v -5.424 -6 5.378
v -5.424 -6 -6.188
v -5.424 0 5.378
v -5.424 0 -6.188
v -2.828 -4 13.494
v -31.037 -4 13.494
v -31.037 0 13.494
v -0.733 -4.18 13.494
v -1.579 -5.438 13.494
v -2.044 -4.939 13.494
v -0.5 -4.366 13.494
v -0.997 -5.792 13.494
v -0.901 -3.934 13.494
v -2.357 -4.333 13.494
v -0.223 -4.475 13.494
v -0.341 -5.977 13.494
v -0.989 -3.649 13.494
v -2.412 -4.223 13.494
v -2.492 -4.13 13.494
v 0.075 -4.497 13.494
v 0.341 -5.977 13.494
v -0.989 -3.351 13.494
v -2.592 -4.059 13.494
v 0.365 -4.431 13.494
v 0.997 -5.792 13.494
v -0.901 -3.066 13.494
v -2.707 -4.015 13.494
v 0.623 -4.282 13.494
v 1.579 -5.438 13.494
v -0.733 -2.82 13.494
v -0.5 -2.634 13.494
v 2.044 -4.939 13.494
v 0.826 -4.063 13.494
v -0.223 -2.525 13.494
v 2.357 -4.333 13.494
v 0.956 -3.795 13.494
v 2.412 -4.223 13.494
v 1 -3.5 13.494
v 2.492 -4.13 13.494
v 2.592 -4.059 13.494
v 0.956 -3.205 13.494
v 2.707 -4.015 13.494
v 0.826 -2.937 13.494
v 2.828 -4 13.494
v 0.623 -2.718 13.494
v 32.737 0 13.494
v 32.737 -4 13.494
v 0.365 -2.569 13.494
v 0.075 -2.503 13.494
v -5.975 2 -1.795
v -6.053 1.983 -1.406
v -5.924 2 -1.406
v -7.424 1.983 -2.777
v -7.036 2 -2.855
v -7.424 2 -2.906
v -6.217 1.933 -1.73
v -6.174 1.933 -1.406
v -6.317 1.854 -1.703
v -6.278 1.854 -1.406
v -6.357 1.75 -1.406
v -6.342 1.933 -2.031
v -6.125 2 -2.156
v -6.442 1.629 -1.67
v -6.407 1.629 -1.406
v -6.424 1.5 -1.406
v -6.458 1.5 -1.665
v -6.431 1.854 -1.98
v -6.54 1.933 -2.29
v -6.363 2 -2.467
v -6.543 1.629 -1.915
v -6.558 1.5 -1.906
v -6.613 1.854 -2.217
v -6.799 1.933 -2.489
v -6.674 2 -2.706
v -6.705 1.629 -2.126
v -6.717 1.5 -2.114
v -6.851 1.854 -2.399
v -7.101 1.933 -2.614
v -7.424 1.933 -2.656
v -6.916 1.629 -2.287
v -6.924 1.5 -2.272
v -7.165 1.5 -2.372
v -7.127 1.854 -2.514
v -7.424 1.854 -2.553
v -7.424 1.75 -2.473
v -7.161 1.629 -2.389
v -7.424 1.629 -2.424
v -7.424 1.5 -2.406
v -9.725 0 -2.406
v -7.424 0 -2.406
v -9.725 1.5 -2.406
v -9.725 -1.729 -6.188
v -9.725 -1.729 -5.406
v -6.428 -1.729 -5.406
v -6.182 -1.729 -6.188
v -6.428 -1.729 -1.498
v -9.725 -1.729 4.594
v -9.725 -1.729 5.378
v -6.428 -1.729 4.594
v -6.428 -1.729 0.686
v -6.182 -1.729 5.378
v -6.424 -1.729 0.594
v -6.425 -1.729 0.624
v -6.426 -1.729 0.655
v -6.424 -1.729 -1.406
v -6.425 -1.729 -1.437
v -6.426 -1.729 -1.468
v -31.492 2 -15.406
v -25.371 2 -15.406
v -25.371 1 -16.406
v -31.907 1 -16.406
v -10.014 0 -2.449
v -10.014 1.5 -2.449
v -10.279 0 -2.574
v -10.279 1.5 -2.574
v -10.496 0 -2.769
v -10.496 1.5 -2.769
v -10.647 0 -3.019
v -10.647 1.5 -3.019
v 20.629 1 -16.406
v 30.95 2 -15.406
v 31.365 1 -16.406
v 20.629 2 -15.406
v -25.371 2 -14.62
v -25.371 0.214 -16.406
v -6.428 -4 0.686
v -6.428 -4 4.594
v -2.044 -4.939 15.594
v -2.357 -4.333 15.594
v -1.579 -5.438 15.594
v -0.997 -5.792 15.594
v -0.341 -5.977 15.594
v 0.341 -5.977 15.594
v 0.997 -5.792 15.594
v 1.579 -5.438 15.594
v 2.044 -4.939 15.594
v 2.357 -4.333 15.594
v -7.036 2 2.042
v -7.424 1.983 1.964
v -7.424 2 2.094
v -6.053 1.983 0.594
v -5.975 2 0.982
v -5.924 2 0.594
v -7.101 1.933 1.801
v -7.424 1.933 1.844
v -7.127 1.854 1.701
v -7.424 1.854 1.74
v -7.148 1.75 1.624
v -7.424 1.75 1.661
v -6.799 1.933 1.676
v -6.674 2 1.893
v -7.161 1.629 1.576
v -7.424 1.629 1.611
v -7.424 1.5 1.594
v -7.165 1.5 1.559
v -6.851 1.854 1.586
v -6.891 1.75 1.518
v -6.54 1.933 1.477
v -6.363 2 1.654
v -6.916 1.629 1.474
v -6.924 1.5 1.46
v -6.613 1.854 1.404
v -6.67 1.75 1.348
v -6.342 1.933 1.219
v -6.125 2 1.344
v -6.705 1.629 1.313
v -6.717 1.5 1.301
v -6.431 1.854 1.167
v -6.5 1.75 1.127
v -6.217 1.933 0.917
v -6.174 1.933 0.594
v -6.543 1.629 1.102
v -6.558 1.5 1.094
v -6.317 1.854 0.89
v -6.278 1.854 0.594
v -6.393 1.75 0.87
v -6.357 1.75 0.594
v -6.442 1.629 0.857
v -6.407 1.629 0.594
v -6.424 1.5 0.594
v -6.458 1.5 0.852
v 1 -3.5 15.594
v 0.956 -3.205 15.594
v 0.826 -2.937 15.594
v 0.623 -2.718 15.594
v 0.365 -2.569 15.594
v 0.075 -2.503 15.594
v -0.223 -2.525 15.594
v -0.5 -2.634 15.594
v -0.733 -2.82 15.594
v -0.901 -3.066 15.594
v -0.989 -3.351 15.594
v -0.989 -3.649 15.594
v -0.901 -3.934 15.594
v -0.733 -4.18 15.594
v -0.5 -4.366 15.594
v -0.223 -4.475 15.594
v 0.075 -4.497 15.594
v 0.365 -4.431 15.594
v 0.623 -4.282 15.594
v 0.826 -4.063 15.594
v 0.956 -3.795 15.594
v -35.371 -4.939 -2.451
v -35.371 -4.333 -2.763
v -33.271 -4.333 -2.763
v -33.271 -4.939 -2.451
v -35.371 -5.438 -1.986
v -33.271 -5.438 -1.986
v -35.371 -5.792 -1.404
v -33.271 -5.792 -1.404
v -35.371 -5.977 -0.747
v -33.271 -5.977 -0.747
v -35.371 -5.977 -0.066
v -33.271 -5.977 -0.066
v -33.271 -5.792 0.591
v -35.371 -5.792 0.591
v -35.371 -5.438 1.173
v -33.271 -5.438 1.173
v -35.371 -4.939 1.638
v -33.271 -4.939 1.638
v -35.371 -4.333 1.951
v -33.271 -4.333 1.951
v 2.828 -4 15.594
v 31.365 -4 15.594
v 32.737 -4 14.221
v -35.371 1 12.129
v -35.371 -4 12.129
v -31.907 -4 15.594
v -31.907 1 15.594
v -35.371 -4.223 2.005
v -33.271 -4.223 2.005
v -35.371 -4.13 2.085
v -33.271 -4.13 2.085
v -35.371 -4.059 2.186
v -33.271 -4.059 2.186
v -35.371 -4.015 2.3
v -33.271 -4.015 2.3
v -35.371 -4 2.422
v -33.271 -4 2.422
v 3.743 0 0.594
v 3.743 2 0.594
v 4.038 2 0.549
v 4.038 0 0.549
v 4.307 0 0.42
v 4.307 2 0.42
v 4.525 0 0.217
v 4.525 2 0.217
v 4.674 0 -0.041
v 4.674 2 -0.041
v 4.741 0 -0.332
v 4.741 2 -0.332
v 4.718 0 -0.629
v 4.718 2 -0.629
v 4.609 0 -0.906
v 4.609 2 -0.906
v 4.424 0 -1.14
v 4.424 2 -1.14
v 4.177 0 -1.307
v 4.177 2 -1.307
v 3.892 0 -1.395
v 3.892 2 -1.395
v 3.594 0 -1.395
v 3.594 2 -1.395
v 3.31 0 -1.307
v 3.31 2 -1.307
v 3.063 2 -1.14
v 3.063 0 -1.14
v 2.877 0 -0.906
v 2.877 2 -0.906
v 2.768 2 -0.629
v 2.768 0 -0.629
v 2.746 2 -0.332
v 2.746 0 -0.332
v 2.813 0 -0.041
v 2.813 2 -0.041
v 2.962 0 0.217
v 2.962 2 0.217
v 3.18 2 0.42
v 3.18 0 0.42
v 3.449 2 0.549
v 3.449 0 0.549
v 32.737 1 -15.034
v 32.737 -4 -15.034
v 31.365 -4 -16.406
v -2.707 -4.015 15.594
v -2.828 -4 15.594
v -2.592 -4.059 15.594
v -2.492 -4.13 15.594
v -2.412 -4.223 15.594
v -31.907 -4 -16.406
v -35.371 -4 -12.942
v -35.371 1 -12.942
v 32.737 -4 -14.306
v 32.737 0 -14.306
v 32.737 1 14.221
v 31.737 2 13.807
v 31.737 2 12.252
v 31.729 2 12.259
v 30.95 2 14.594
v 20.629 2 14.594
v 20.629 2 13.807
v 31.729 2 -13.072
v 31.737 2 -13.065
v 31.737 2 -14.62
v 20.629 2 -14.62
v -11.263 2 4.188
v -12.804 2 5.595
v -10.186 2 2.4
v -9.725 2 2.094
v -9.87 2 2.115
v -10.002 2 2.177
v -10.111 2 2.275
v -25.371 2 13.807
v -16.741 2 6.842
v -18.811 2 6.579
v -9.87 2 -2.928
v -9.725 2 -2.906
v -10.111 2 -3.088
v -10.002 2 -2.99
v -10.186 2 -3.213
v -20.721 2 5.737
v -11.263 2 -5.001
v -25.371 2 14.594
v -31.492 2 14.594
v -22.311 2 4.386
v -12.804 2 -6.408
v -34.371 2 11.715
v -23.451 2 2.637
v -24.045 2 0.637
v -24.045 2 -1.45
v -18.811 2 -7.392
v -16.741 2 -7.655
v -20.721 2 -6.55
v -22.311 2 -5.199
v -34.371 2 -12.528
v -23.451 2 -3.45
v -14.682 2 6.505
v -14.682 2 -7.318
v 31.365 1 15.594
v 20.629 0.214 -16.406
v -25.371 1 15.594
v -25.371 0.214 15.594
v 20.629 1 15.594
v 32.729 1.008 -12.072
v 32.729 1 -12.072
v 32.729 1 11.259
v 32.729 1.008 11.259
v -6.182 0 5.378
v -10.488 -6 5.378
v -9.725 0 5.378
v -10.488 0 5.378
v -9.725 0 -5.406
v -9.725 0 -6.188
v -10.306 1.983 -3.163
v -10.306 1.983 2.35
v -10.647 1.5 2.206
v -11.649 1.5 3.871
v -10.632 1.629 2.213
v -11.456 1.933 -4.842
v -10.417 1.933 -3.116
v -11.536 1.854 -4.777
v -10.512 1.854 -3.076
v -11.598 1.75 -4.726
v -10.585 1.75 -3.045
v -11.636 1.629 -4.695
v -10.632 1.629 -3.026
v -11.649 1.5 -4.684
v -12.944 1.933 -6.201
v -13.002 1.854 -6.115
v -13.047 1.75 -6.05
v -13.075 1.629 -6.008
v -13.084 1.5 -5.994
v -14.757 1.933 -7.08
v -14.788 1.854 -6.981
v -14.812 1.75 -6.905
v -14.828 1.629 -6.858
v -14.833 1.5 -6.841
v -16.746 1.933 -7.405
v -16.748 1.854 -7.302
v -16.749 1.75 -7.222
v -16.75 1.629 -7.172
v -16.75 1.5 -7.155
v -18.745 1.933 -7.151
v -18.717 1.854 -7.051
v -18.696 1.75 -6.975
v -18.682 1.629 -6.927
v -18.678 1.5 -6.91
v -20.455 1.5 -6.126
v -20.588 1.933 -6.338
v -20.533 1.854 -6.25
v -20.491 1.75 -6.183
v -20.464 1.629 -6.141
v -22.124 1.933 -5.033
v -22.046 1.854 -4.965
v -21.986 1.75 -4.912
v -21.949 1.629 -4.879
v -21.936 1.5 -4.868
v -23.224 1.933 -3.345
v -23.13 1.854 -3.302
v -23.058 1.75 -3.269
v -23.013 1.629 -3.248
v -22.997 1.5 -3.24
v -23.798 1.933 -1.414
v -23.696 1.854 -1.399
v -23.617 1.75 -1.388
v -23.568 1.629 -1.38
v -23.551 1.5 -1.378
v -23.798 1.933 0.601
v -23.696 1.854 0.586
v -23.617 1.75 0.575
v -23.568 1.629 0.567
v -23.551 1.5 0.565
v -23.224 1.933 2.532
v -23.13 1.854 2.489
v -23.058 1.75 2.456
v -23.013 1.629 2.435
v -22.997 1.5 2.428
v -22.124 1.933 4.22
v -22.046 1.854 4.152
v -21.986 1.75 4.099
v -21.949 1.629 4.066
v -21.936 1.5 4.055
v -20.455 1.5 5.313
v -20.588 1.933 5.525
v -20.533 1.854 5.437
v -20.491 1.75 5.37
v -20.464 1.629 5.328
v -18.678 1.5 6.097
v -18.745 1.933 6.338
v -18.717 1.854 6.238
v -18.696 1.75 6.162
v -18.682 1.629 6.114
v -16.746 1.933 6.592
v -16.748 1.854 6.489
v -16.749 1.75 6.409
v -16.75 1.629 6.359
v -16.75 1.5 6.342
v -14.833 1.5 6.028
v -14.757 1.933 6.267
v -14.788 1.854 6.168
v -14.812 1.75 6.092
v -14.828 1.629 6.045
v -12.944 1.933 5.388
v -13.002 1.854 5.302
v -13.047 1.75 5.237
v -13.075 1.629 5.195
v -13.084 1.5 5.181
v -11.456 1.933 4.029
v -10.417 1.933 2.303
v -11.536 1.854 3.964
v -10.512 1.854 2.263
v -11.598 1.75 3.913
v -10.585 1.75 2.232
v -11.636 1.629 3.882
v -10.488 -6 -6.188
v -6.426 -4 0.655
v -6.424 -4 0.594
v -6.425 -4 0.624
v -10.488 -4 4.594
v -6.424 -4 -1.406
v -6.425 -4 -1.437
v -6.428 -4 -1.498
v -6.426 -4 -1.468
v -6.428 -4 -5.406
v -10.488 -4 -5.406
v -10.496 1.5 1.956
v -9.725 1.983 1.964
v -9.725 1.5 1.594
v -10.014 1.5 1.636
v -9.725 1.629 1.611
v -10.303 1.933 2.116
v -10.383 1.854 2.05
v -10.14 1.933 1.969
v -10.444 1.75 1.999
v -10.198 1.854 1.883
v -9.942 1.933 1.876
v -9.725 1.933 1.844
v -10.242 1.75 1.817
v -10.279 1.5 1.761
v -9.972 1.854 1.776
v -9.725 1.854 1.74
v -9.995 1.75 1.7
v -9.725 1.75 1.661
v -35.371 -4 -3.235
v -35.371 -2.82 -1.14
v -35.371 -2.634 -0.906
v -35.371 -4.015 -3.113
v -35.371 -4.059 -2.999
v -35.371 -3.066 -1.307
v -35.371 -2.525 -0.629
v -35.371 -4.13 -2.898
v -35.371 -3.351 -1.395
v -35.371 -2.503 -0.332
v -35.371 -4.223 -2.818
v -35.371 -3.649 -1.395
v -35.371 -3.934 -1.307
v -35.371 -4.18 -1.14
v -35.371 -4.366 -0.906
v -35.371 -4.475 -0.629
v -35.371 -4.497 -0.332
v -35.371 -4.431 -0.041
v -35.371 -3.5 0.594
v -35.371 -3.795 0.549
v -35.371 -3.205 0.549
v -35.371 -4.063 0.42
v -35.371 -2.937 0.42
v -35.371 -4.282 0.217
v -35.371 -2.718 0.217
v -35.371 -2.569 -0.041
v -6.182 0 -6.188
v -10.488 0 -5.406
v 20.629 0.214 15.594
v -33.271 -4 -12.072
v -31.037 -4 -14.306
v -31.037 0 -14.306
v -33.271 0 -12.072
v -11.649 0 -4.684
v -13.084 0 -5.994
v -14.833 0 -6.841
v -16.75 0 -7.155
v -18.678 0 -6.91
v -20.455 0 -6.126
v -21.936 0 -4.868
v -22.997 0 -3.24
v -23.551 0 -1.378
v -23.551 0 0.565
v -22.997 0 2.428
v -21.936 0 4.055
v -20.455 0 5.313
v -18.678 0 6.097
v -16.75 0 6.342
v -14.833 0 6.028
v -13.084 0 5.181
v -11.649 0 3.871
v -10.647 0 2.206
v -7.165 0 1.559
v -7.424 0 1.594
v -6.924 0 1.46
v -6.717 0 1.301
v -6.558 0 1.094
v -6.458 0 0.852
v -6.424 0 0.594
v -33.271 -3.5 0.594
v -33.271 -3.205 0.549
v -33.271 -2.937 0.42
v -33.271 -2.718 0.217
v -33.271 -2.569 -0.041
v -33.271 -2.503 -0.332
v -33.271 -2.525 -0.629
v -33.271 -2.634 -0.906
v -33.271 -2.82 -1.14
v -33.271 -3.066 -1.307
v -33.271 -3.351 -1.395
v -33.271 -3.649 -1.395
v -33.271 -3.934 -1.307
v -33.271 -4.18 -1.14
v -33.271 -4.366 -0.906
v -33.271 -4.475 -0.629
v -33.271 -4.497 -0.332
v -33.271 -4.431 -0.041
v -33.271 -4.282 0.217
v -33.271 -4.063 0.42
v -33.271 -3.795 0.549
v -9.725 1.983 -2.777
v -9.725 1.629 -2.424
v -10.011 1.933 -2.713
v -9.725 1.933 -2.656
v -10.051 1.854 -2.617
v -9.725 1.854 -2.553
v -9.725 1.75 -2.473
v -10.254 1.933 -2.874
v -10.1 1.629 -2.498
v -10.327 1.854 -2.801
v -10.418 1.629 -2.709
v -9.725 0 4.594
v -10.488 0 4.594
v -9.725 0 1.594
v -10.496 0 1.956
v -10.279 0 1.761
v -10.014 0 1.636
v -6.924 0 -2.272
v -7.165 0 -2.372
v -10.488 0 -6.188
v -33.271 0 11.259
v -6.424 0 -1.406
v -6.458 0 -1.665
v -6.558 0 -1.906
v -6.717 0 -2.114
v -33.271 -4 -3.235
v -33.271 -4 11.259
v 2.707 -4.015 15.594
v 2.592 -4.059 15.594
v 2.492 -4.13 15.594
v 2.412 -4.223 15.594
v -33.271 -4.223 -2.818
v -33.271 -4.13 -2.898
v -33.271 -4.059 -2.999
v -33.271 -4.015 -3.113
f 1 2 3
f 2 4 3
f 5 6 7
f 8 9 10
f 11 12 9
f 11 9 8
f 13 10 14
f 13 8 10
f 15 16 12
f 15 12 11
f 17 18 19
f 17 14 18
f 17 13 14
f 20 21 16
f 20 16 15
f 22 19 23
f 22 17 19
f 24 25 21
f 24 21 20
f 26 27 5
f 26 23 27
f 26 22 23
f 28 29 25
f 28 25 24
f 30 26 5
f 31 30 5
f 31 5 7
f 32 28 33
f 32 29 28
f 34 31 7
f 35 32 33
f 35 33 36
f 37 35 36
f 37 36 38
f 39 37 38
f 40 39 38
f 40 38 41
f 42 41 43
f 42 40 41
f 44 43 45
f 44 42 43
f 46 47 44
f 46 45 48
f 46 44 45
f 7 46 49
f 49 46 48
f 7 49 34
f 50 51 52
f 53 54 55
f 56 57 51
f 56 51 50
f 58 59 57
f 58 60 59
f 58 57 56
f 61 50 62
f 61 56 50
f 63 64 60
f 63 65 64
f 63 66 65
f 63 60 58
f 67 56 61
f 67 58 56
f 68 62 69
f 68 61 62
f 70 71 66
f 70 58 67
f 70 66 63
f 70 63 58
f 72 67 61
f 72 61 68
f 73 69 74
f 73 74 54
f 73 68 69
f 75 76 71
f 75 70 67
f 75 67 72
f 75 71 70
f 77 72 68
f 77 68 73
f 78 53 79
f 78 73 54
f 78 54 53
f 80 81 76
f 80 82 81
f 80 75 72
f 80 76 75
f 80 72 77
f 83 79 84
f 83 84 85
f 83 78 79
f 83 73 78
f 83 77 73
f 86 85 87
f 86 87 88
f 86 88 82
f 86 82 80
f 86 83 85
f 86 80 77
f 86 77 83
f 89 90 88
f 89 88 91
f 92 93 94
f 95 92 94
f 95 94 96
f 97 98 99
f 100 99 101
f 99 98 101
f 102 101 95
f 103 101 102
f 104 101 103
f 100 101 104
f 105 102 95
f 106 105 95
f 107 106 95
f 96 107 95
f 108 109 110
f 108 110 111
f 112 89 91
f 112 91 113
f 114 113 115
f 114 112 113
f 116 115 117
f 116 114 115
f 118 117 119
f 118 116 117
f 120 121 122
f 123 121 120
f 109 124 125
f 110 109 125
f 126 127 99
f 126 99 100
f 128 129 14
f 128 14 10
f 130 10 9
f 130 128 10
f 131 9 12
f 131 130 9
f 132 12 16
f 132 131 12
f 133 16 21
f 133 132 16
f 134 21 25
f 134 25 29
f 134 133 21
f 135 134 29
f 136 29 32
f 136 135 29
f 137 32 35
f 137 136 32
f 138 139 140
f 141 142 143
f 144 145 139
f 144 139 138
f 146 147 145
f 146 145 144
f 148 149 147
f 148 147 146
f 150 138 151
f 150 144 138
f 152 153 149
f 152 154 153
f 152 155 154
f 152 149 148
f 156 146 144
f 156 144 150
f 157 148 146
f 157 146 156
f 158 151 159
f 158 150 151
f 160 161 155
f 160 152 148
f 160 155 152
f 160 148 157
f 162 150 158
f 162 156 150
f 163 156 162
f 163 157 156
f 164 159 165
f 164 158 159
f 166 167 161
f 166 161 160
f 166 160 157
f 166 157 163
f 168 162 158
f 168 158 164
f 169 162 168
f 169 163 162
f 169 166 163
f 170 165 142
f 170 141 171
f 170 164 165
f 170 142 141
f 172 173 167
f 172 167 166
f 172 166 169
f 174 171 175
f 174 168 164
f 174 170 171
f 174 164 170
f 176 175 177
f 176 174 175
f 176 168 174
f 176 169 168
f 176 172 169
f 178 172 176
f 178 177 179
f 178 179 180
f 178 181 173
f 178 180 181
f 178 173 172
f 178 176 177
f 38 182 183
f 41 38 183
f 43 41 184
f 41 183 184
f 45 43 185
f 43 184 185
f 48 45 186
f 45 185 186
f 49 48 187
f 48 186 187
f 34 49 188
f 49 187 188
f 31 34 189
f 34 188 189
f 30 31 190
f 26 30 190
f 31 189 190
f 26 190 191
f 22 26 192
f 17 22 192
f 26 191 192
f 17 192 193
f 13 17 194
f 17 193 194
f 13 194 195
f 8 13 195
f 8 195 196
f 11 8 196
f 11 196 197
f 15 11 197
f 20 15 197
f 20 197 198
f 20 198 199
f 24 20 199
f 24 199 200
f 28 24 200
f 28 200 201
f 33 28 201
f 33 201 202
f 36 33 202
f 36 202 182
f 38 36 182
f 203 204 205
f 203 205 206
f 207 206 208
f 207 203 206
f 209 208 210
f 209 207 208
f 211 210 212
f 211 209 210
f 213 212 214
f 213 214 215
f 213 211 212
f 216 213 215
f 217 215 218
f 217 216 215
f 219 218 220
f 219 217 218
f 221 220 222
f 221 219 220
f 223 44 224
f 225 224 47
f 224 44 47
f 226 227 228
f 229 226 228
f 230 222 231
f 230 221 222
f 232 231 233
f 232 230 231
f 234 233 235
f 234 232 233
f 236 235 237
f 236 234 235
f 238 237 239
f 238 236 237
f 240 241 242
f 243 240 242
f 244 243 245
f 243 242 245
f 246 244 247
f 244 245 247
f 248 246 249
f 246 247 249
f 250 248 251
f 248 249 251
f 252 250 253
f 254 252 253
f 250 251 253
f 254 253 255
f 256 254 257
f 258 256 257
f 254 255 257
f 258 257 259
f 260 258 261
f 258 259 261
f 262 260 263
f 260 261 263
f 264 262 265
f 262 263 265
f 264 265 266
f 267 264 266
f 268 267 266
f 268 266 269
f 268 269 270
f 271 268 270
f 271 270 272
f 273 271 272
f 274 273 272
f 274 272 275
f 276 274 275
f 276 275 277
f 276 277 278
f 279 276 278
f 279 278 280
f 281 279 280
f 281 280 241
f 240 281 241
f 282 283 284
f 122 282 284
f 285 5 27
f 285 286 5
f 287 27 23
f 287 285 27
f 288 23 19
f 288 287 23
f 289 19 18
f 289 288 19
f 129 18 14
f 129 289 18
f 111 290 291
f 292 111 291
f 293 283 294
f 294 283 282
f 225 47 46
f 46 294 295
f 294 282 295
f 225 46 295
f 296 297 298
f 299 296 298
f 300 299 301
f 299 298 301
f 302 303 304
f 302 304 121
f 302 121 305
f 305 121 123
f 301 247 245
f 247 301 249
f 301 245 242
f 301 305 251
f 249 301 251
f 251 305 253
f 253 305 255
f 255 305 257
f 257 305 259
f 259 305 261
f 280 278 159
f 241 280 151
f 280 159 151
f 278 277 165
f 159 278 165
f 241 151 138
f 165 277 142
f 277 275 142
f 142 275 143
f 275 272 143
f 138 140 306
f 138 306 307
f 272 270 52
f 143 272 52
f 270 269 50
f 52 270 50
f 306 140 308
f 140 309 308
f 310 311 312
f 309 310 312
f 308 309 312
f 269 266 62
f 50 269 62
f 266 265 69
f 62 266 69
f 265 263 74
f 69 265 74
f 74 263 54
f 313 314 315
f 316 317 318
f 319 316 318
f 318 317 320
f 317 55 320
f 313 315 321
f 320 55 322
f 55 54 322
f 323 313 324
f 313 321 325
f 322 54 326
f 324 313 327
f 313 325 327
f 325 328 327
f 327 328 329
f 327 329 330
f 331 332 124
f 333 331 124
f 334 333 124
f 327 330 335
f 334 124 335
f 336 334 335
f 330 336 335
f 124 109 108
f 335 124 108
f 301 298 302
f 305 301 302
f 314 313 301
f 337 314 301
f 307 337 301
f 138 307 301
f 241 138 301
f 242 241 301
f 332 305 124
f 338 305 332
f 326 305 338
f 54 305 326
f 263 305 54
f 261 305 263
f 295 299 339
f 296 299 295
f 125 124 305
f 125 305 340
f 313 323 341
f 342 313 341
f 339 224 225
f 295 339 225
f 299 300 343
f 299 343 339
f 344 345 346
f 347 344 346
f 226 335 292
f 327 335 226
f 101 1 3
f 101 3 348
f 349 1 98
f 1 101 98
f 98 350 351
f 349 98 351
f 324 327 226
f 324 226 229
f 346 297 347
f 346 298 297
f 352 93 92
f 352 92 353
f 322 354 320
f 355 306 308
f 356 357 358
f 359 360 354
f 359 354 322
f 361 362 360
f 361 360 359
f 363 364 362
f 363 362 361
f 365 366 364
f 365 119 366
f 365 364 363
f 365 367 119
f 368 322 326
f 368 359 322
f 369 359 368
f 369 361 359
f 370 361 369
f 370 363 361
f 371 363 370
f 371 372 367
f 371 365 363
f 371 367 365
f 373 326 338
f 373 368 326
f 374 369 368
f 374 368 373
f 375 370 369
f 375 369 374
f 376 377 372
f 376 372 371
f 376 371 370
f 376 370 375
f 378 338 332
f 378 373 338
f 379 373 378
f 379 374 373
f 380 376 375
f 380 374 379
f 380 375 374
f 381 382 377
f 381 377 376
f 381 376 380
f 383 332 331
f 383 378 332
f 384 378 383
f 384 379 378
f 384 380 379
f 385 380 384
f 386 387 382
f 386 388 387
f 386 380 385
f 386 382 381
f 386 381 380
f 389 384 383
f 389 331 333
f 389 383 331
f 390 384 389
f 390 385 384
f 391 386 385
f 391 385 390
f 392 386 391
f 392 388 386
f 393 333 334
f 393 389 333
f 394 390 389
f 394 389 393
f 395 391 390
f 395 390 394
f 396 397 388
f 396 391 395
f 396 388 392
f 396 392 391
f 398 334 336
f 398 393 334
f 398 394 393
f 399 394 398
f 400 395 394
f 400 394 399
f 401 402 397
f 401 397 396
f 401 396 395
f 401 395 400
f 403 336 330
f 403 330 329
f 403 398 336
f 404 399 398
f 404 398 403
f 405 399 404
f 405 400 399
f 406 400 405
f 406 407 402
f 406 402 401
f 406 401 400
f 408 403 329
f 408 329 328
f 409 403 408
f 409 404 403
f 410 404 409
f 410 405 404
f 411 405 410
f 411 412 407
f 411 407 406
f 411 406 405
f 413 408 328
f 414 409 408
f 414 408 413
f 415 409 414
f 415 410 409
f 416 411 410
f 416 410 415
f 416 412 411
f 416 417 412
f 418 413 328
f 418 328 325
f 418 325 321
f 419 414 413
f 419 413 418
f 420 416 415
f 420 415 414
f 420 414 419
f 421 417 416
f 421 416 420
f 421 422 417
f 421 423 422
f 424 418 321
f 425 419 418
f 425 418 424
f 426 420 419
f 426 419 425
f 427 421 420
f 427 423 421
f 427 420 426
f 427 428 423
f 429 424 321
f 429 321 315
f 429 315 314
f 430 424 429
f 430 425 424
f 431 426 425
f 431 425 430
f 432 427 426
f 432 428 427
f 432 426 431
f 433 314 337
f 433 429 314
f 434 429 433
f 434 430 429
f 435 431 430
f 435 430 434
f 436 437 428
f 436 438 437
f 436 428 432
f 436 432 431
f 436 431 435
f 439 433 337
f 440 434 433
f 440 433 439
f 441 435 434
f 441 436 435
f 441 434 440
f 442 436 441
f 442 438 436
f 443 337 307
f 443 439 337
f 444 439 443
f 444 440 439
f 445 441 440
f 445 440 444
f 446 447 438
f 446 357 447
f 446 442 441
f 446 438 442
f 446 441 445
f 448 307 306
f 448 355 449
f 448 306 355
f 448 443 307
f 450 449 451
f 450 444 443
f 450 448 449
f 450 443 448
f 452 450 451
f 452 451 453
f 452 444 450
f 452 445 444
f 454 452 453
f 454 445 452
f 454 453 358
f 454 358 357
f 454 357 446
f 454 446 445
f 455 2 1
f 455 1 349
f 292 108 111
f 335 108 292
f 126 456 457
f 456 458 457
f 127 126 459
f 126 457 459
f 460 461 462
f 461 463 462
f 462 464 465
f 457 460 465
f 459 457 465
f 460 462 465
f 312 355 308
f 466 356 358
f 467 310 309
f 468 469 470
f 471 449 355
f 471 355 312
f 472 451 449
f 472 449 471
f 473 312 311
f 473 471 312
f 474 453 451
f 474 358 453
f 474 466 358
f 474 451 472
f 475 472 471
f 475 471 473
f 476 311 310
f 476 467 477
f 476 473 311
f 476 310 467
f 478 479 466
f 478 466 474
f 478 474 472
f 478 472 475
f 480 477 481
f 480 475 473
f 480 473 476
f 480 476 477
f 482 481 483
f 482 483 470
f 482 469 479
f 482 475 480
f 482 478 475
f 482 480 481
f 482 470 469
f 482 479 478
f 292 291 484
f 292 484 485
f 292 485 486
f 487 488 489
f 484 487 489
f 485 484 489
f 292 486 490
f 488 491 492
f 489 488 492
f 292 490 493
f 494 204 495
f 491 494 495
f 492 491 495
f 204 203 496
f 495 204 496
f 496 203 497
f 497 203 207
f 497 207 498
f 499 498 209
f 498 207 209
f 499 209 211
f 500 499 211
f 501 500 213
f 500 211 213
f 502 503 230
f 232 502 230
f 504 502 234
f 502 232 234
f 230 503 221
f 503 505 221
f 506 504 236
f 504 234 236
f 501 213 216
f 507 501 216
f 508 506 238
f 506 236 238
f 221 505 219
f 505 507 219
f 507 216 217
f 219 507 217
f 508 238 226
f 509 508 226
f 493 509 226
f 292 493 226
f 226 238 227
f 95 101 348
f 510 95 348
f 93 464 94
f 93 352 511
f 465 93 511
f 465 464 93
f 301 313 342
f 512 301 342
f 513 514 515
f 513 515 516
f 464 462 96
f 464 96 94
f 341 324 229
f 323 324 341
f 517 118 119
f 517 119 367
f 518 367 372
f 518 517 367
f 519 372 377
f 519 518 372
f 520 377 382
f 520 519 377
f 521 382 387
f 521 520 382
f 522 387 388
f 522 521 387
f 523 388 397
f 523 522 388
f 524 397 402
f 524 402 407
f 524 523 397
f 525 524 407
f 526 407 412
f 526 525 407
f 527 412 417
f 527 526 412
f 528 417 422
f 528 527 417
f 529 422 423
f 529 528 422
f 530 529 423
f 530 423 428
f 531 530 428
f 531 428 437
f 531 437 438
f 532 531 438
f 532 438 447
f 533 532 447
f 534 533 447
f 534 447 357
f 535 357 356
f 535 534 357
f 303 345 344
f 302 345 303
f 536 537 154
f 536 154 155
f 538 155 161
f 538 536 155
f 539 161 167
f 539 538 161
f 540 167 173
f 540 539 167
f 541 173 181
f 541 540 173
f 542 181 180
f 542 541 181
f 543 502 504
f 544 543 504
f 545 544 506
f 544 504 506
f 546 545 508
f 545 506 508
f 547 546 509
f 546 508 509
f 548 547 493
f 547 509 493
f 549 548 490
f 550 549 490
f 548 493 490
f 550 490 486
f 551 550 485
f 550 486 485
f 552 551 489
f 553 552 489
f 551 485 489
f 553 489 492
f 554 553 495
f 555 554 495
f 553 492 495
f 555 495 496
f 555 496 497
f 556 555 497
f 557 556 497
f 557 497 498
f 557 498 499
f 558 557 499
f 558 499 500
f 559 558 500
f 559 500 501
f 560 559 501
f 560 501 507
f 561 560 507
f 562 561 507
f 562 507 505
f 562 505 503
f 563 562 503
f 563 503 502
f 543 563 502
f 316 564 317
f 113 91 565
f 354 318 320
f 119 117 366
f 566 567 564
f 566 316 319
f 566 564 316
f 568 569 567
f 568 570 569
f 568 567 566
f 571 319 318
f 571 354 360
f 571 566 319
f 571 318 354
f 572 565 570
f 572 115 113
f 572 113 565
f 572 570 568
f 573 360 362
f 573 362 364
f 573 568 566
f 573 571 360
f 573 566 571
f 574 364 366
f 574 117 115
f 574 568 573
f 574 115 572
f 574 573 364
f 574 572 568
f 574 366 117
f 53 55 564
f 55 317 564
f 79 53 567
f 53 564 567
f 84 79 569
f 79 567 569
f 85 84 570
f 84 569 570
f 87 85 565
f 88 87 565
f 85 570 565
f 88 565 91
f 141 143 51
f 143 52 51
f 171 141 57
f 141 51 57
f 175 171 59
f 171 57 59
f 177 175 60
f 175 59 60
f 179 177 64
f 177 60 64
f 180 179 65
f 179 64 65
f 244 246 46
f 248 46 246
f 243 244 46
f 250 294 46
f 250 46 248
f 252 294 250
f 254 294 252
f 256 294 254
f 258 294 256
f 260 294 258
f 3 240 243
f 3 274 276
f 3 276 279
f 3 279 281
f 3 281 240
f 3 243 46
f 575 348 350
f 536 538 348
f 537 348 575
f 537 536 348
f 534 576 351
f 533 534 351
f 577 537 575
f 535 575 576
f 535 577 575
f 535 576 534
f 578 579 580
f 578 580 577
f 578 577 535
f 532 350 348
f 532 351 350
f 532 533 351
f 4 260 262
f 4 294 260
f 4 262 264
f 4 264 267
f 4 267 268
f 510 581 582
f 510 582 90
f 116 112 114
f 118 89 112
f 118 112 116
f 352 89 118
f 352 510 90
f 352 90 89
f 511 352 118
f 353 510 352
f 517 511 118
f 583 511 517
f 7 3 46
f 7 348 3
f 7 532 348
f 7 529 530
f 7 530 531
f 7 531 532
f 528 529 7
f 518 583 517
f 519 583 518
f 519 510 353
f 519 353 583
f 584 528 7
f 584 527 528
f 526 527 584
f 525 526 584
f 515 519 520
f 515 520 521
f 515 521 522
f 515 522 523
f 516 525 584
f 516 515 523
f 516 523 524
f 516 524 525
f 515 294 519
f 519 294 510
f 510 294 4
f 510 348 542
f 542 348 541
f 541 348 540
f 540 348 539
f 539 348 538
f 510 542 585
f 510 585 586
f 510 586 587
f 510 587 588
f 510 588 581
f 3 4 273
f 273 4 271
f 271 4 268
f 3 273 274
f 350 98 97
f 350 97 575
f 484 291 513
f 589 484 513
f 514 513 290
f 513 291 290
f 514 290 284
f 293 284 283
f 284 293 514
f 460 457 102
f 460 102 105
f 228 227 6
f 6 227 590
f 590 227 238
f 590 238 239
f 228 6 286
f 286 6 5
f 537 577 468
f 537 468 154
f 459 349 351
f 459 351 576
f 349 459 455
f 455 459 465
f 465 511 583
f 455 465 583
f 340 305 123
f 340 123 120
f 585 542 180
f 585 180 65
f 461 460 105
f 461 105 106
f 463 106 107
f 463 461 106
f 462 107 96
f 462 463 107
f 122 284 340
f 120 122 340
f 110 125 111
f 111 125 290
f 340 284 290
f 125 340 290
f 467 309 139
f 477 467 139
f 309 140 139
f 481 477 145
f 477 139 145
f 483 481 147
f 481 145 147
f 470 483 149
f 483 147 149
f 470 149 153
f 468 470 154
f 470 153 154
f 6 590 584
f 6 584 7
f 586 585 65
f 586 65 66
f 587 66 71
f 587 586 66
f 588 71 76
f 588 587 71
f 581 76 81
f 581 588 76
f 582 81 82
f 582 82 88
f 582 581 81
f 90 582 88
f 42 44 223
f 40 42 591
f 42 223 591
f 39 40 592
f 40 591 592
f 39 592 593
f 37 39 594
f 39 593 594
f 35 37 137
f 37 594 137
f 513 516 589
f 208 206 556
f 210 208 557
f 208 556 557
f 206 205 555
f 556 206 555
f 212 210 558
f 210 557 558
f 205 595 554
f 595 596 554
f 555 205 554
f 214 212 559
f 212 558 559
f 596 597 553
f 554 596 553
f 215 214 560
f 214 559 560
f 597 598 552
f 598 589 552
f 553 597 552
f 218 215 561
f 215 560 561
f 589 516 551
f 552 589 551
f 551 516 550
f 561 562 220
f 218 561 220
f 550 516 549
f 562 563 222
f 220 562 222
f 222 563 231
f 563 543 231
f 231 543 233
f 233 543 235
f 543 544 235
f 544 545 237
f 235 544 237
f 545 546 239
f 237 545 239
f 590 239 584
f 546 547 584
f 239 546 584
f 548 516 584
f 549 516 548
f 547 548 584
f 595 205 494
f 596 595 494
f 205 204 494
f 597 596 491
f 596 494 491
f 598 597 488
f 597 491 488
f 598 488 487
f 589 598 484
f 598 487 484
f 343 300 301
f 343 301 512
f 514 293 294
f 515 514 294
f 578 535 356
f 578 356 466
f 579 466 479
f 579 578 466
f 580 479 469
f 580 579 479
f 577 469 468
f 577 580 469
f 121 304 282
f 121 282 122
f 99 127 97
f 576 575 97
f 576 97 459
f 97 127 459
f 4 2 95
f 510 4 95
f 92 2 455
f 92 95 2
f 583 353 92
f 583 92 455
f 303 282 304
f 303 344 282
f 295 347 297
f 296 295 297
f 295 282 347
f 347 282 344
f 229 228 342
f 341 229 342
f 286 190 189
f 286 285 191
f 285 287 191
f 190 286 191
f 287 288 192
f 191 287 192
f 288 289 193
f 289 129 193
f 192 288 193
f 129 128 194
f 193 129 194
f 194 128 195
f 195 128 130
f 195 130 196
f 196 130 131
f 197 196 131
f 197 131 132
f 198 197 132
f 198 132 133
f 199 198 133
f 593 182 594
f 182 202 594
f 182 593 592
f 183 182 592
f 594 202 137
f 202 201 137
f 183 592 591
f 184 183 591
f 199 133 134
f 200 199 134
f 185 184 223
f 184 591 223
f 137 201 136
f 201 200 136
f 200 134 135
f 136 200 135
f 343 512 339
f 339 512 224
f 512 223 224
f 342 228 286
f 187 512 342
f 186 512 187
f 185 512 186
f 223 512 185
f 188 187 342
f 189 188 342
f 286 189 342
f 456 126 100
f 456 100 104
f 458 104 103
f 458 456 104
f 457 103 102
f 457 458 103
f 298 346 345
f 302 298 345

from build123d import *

# Parameters (mm, degrees)
BOSS_EXTRUDE1_DEPTH      = 2
BOSS_EXTRUDE2_DEPTH      = 2
BOSS_EXTRUDE2_DEPTH_BACK = 4
CHAMFER2_SIZE            = 1
CUT_EXTRUDE3_DEPTH       = 6
CHAMFER3_SIZE            = 1
CHAMFER4_SIZE            = 1
SKETCH5_W                = 27.8
SKETCH5_H                = 4
CUT_EXTRUDE4_DEPTH       = 6
FILLET1_R                = 0.5
CUT_EXTRUDE5_START       = -10
CUT_EXTRUDE5_DEPTH       = 46
SKETCH7_R                = 2.5
BOSS_EXTRUDE3_DEPTH      = 2.1
FILLET2_R                = 0.5
SKETCH8_R                = 2.5
BOSS_EXTRUDE4_DEPTH      = 2.1
FILLET3_R                = 0.5
SKETCH9_R                = 1
CUT_EXTRUDE6_DEPTH       = 46
SKETCH10_R               = 1
CUT_EXTRUDE7_DEPTH       = 6
SKETCH11_R               = 1
CUT_EXTRUDE8_DEPTH       = 10
BOSS_EXTRUDE5_START      = 4
SKETCH12_W               = 5.064195868
SKETCH12_H               = 0.781312031
SKETCH12_H_2             = 0.784523075
BOSS_EXTRUDE5_DEPTH      = 4
BOSS_EXTRUDE6_START      = 4
SKETCH12_4_W             = 5.064195868
SKETCH12_4_H             = 0.781312031
SKETCH12_4_H_2           = 0.784523075
BOSS_EXTRUDE6_DEPTH      = 2
CUT_EXTRUDE9_REACH       = 43.972
SKETCH14_W               = 3.543409349
SKETCH14_H               = 1.728514359


with BuildPart() as part:
    # Sketch1 → Boss-Extrude1 (new body)
    # profile 1 of 2: a face of its own
    with BuildSketch(Plane(origin=(0, 0, 0), x_dir=(1, 0, 0), z_dir=(0, 1, 0))):
        Polygon((32.729021504, 4.406467745), (32.729021504, 12.07215317), (30.494706929, 14.306467745), (-31.036663921, 14.306467745), (-33.270978496, 12.07215317), (-33.270978496, -11.25921768), (-31.036663921, -13.493532255), (30.494706929, -13.493532255), (32.729021504, -11.25921768), (32.729021504, -3.593532255), align=None)
        Polygon((32.329021504, 4.406467745), (32.329021504, 11.906467745), (30.329021504, 13.906467745), (-30.870978496, 13.906467745), (-32.870978496, 11.906467745), (-32.870978496, -11.093532255), (-30.870978496, -13.093532255), (30.329021504, -13.093532255), (32.329021504, -11.093532255), (32.329021504, -3.593532255), align=None, mode=Mode.SUBTRACT)
    # profile 2 of 2: a face of its own
    with BuildSketch(Plane(origin=(0, 0, 0), x_dir=(1, 0, 0), z_dir=(0, 1, 0))):
        Polygon((32.329021504, 4.406467745), (32.329021504, -3.593532255), (32.329021504, -11.093532255), (30.329021504, -13.093532255), (-30.870978496, -13.093532255), (-32.870978496, -11.093532255), (-32.870978496, 11.906467745), (-30.870978496, 13.906467745), (30.329021504, 13.906467745), (32.329021504, 11.906467745), align=None)
        with BuildLine():
            ThreePointArc((-9.725175532, 2.406467745), (-10.278756252, 2.573672219), (-10.647214625, 3.01937097))
            ThreePointArc((-10.647214625, 3.01937097), (-23.620978496, 0.406467745), (-10.647214625, -2.206435481))
            ThreePointArc((-10.647214625, -2.206435481), (-10.278756252, -1.76073673), (-9.725175532, -1.593532255))
            Line((-9.725175532, -1.593532255), (-7.424080017, -1.593532255))
            ThreePointArc((-7.424080017, -1.593532255), (-6.716973236, -1.300639037), (-6.424080017, -0.593532255))
            Line((-6.424080017, -0.593532255), (-6.424080017, 1.406467745))
            ThreePointArc((-6.424080017, 1.406467745), (-6.716973236, 2.113574526), (-7.424080017, 2.406467745))
            Line((-7.424080017, 2.406467745), (-9.725175532, 2.406467745))
        make_face(mode=Mode.SUBTRACT)
    extrude(amount=BOSS_EXTRUDE1_DEPTH)

    # Chamfer4
    chamfer4_edges = [part.edges().sort_by_distance(p)[0] for p in [
        (32.729021504, 2, -0.406467745),
    ]]
    chamfer(chamfer4_edges, length=CHAMFER4_SIZE)

    # Fillet1
    fillet1_edges = [part.edges().sort_by_distance(p)[0] for p in [
        (-8.574627775, 2, -2.406467745),
        (-6.716973236, 2, -2.113574526),
        (-6.424080017, 2, -0.406467745),
        (-6.716973236, 2, 1.300639037),
        (-8.574627775, 2, 1.593532255),
        (-10.278756252, 2, 1.76073673),
        (-23.620978496, 2, -0.406467745),
        (-10.278756252, 2, -2.573672219),
    ]]
    fillet(fillet1_edges, radius=FILLET1_R)

    # Sketch11 → Cut-Extrude8 (cut)
    with BuildSketch(Plane(origin=(0, 2, 0), x_dir=(1, 0, 0), z_dir=(0, 1, 0))):
        with Locations(Location((3.743408684, 0.406467745, 0), (0, 0, 270))):
            Circle(SKETCH11_R)
    extrude(amount=-CUT_EXTRUDE8_DEPTH, mode=Mode.SUBTRACT)


with BuildPart() as body_2:
    # Sketch1<3> → Boss-Extrude2 (new, two sides: drawn at the far end of the back side and taken through both)
    with BuildSketch(Plane(origin=(0, 0, 0), x_dir=(1, 0, 0), z_dir=(0, 1, 0)).offset(-BOSS_EXTRUDE2_DEPTH_BACK)):
        Polygon((34.829021504, 12.942001651), (31.36455541, 16.406467745), (-31.906512402, 16.406467745), (-35.370978496, 12.942001651), (-35.370978496, -12.129066161), (-31.906512402, -15.593532255), (31.36455541, -15.593532255), (34.829021504, -12.129066161), (34.829021504, -3.593532255), (34.829021504, 4.406467745), align=None)
        Polygon((32.729021504, 12.07215317), (30.494706929, 14.306467745), (-31.036663921, 14.306467745), (-33.270978496, 12.07215317), (-33.270978496, -11.25921768), (-31.036663921, -13.493532255), (30.494706929, -13.493532255), (32.729021504, -11.25921768), (32.729021504, -3.593532255), (32.729021504, 4.406467745), align=None, mode=Mode.SUBTRACT)
    extrude(amount=BOSS_EXTRUDE2_DEPTH + BOSS_EXTRUDE2_DEPTH_BACK)

    # Chamfer2
    chamfer2_edges = [body_2.edges().sort_by_distance(p)[0] for p in [
        (-0.270978496, 2, -16.406467745),
        (-33.638745449, 2, -14.674234698),
        (-35.370978496, 2, -0.406467745),
        (-33.638745449, 2, 13.861299208),
        (-0.270978496, 2, 15.593532255),
        (33.096788457, 2, 13.861299208),
        (34.829021504, 2, -0.406467745),
        (33.096788457, 2, -14.674234698),
    ]]
    chamfer(chamfer2_edges, length=CHAMFER2_SIZE)

    # Sketch4 → Cut-Extrude3 (cut)
    with BuildSketch(Plane(origin=(0, 2, 0), x_dir=(1, 0, 0), z_dir=(0, 1, 0))):
        Polygon((32.736607325, 12.100069105), (32.736607325, 15.066969795), (34.829021504, 12.974555617), (34.829021504, -12.129066161), (32.736607325, -14.22148034), (32.736607325, -11.231301745), align=None)
    extrude(amount=-CUT_EXTRUDE3_DEPTH, mode=Mode.SUBTRACT)

    # Chamfer3
    # the kernel refuses this chamfer: 1 mm, written as the material it takes off along each edge
    with BuildSketch(Plane(origin=(32.736607325, 2, 15.378949765), x_dir=(0.02749587661058907, -0.9996219169112965, 0), z_dir=(0, 0, -1))) as chamfer3_piece_1:
        Polygon((CHAMFER3_SIZE * 0.999621916911, CHAMFER3_SIZE * 0.0274958766106), (-CHAMFER3_SIZE * 0.0274958766106, CHAMFER3_SIZE * 0.999621916911), (0, 0), align=None)
    extrude(amount=31.57083502, mode=Mode.SUBTRACT)

    # Sketch5 → Cut-Extrude4 (cut)
    with BuildSketch(Plane(origin=(32.736607325, 0, 0), x_dir=(0, 0, -1), z_dir=(1, 0, 0))):
        with Locations((0.406467745, -2)):
            Rectangle(SKETCH5_W, SKETCH5_H)
    extrude(amount=-CUT_EXTRUDE4_DEPTH, mode=Mode.SUBTRACT)

    # Sketch6 → Cut-Extrude5 (cut)
    with BuildSketch(Plane.ZY.offset(35.370978496).offset(CUT_EXTRUDE5_START)):
        Polygon((-14.620202266, 2), (-16.406467745, 0.213734522), (-16.406467745, 2), align=None)
        Polygon((15.593532255, 2), (13.807266777, 2), (15.593532255, 0.213734522), align=None)
    extrude(amount=-CUT_EXTRUDE5_DEPTH, mode=Mode.SUBTRACT)

    # Sketch7 → Boss-Extrude3 (add)
    with BuildSketch(Plane.XY.offset(15.593532255)):
        with Locations((0, -3.5)):
            Circle(SKETCH7_R)
    extrude(amount=-BOSS_EXTRUDE3_DEPTH)

    # Fillet2
    fillet2_edges = [body_2.edges().sort_by_distance(p)[0] for p in [
        (2.449489743, -4, 14.543532255),
        (-2.449489743, -4, 14.543532255),
    ]]
    fillet(fillet2_edges, radius=FILLET2_R)

    # Sketch8 → Boss-Extrude4 (add)
    with BuildSketch(Plane.ZY.offset(35.370978496)):
        with Locations((-0.406467745, -3.5)):
            Circle(SKETCH8_R)
    extrude(amount=-BOSS_EXTRUDE4_DEPTH)

    # Fillet3
    fillet3_edges = [body_2.edges().sort_by_distance(p)[0] for p in [
        (-34.320978496, -4, -2.855957487),
        (-34.320978496, -4, 2.043021998),
    ]]
    fillet(fillet3_edges, radius=FILLET3_R)

    # Sketch9 → Cut-Extrude6 (cut)
    with BuildSketch(Plane.ZY.offset(35.370978496)):
        with Locations((-0.406467745, -3.5)):
            Circle(SKETCH9_R)
    extrude(amount=-CUT_EXTRUDE6_DEPTH, mode=Mode.SUBTRACT)

    # Sketch10 → Cut-Extrude7 (cut)
    with BuildSketch(Plane.XY.offset(15.593532255)):
        with Locations((0, -3.5)):
            Circle(SKETCH10_R)
    extrude(amount=-CUT_EXTRUDE7_DEPTH, mode=Mode.SUBTRACT)


    add(part.part)  # Boss-Extrude5 merges part
    # Sketch12 → Boss-Extrude5 (add)
    with BuildSketch(Plane(origin=(0, 0, 0), x_dir=(-1, 0, 0), z_dir=(0, -1, 0)).offset(BOSS_EXTRUDE5_START)):
        with Locations((7.956177951, 5.79712376)):
            Rectangle(SKETCH12_W, SKETCH12_H)
        with BuildLine():
            Line((5.424080017, -4.593532255), (6.428321603, -4.593532255))
            Line((6.428321603, -4.593532255), (6.428321603, -0.685538667))
            ThreePointArc((6.428321603, -0.685538667), (6.425140976, -0.639584321), (6.424080017, -0.593532255))
            Line((6.424080017, -0.593532255), (6.424080017, 1.406467745))
            ThreePointArc((6.424080017, 1.406467745), (6.425140976, 1.45251981), (6.428321603, 1.498474156))
            Line((6.428321603, 1.498474156), (6.428321603, 5.406467745))
            Line((6.428321603, 5.406467745), (5.424080017, 5.406467745))
            Line((5.424080017, 5.406467745), (5.424080017, -4.593532255))
        make_face()
        with Locations((7.956177951, -4.985793793)):
            Rectangle(SKETCH12_W, SKETCH12_H_2)
    extrude(amount=-BOSS_EXTRUDE5_DEPTH)

    # Sketch12<4> → Boss-Extrude6 (add)
    with BuildSketch(Plane(origin=(0, 0, 0), x_dir=(-1, 0, 0), z_dir=(0, -1, 0)).offset(BOSS_EXTRUDE6_START)):
        with BuildLine():
            ThreePointArc((9.725175532, 2.406467745), (10.145722789, 2.499197109), (10.488275885, 2.760187734))
            Line((10.488275885, 2.760187734), (10.488275885, 5.406467745))
            Line((10.488275885, 5.406467745), (6.428321603, 5.406467745))
            Line((6.428321603, 5.406467745), (6.428321603, 1.498474156))
            ThreePointArc((6.428321603, 1.498474156), (6.750287175, 2.145388042), (7.424080017, 2.406467745))
            Line((7.424080017, 2.406467745), (9.725175532, 2.406467745))
        make_face()
        with BuildLine():
            Line((6.428321603, -4.593532255), (10.488275885, -4.593532255))
            Line((10.488275885, -4.593532255), (10.488275885, -1.947252245))
            ThreePointArc((10.488275885, -1.947252245), (10.145722789, -1.68626162), (9.725175532, -1.593532255))
            Line((9.725175532, -1.593532255), (7.424080017, -1.593532255))
            ThreePointArc((7.424080017, -1.593532255), (6.750287175, -1.332452553), (6.428321603, -0.685538667))
            Line((6.428321603, -0.685538667), (6.428321603, -4.593532255))
        make_face()
        with BuildLine():
            Line((5.424080017, -4.593532255), (6.428321603, -4.593532255))
            Line((6.428321603, -4.593532255), (6.428321603, -0.685538667))
            ThreePointArc((6.428321603, -0.685538667), (6.425140976, -0.639584321), (6.424080017, -0.593532255))
            Line((6.424080017, -0.593532255), (6.424080017, 1.406467745))
            ThreePointArc((6.424080017, 1.406467745), (6.425140976, 1.45251981), (6.428321603, 1.498474156))
            Line((6.428321603, 1.498474156), (6.428321603, 5.406467745))
            Line((6.428321603, 5.406467745), (5.424080017, 5.406467745))
            Line((5.424080017, 5.406467745), (5.424080017, -4.593532255))
        make_face()
        with Locations((7.956177951, 5.79712376)):
            Rectangle(SKETCH12_4_W, SKETCH12_4_H)
        with BuildLine():
            ThreePointArc((9.725175532, -1.593532255), (10.145722789, -1.68626162), (10.488275885, -1.947252245))
            Line((10.488275885, -1.947252245), (10.488275885, 2.760187734))
            ThreePointArc((10.488275885, 2.760187734), (10.145722789, 2.499197109), (9.725175532, 2.406467745))
            Line((9.725175532, 2.406467745), (7.424080017, 2.406467745))
            ThreePointArc((7.424080017, 2.406467745), (6.750287175, 2.145388042), (6.428321603, 1.498474156))
            Line((6.428321603, 1.498474156), (6.428321603, -0.685538667))
            ThreePointArc((6.428321603, -0.685538667), (6.750287175, -1.332452553), (7.424080017, -1.593532255))
            Line((7.424080017, -1.593532255), (9.725175532, -1.593532255))
        make_face()
        with Locations((7.956177951, -4.985793793)):
            Rectangle(SKETCH12_4_W, SKETCH12_4_H_2)
        with BuildLine():
            ThreePointArc((6.424080017, -0.593532255), (6.425140976, -0.639584321), (6.428321603, -0.685538667))
            Line((6.428321603, -0.685538667), (6.428321603, 1.498474156))
            ThreePointArc((6.428321603, 1.498474156), (6.425140976, 1.45251981), (6.424080017, 1.406467745))
            Line((6.424080017, 1.406467745), (6.424080017, -0.593532255))
        make_face()
    extrude(amount=BOSS_EXTRUDE6_DEPTH)

    # Cut-Extrude9: up to this face of the body (flat: up to its plane)
    cut_extrude9_end = Plane(body_2.part.faces().sort_by_distance((-7.956177951, -3, -6.187779776))[0])
    # Sketch14 → Cut-Extrude9 (cut, up to the picked face)
    with BuildSketch(Plane.XY.offset(5.37805533), mode=Mode.PRIVATE) as cut_extrude9_sk1:
        with Locations((-7.953470858, -0.86425718)):
            Rectangle(SKETCH14_W, SKETCH14_H)
    cut_extrude9_tool1 = split(extrude(cut_extrude9_sk1.sketch, amount=-CUT_EXTRUDE9_REACH, mode=Mode.PRIVATE), bisect_by=cut_extrude9_end, keep=Keep.BOTH, mode=Mode.PRIVATE)
    add(cut_extrude9_tool1.solids().sort_by(Axis((-7.953471, -0.864257, 5.378055), (0, 0, -1)))[0], mode=Mode.SUBTRACT)


solid = body_2.part
